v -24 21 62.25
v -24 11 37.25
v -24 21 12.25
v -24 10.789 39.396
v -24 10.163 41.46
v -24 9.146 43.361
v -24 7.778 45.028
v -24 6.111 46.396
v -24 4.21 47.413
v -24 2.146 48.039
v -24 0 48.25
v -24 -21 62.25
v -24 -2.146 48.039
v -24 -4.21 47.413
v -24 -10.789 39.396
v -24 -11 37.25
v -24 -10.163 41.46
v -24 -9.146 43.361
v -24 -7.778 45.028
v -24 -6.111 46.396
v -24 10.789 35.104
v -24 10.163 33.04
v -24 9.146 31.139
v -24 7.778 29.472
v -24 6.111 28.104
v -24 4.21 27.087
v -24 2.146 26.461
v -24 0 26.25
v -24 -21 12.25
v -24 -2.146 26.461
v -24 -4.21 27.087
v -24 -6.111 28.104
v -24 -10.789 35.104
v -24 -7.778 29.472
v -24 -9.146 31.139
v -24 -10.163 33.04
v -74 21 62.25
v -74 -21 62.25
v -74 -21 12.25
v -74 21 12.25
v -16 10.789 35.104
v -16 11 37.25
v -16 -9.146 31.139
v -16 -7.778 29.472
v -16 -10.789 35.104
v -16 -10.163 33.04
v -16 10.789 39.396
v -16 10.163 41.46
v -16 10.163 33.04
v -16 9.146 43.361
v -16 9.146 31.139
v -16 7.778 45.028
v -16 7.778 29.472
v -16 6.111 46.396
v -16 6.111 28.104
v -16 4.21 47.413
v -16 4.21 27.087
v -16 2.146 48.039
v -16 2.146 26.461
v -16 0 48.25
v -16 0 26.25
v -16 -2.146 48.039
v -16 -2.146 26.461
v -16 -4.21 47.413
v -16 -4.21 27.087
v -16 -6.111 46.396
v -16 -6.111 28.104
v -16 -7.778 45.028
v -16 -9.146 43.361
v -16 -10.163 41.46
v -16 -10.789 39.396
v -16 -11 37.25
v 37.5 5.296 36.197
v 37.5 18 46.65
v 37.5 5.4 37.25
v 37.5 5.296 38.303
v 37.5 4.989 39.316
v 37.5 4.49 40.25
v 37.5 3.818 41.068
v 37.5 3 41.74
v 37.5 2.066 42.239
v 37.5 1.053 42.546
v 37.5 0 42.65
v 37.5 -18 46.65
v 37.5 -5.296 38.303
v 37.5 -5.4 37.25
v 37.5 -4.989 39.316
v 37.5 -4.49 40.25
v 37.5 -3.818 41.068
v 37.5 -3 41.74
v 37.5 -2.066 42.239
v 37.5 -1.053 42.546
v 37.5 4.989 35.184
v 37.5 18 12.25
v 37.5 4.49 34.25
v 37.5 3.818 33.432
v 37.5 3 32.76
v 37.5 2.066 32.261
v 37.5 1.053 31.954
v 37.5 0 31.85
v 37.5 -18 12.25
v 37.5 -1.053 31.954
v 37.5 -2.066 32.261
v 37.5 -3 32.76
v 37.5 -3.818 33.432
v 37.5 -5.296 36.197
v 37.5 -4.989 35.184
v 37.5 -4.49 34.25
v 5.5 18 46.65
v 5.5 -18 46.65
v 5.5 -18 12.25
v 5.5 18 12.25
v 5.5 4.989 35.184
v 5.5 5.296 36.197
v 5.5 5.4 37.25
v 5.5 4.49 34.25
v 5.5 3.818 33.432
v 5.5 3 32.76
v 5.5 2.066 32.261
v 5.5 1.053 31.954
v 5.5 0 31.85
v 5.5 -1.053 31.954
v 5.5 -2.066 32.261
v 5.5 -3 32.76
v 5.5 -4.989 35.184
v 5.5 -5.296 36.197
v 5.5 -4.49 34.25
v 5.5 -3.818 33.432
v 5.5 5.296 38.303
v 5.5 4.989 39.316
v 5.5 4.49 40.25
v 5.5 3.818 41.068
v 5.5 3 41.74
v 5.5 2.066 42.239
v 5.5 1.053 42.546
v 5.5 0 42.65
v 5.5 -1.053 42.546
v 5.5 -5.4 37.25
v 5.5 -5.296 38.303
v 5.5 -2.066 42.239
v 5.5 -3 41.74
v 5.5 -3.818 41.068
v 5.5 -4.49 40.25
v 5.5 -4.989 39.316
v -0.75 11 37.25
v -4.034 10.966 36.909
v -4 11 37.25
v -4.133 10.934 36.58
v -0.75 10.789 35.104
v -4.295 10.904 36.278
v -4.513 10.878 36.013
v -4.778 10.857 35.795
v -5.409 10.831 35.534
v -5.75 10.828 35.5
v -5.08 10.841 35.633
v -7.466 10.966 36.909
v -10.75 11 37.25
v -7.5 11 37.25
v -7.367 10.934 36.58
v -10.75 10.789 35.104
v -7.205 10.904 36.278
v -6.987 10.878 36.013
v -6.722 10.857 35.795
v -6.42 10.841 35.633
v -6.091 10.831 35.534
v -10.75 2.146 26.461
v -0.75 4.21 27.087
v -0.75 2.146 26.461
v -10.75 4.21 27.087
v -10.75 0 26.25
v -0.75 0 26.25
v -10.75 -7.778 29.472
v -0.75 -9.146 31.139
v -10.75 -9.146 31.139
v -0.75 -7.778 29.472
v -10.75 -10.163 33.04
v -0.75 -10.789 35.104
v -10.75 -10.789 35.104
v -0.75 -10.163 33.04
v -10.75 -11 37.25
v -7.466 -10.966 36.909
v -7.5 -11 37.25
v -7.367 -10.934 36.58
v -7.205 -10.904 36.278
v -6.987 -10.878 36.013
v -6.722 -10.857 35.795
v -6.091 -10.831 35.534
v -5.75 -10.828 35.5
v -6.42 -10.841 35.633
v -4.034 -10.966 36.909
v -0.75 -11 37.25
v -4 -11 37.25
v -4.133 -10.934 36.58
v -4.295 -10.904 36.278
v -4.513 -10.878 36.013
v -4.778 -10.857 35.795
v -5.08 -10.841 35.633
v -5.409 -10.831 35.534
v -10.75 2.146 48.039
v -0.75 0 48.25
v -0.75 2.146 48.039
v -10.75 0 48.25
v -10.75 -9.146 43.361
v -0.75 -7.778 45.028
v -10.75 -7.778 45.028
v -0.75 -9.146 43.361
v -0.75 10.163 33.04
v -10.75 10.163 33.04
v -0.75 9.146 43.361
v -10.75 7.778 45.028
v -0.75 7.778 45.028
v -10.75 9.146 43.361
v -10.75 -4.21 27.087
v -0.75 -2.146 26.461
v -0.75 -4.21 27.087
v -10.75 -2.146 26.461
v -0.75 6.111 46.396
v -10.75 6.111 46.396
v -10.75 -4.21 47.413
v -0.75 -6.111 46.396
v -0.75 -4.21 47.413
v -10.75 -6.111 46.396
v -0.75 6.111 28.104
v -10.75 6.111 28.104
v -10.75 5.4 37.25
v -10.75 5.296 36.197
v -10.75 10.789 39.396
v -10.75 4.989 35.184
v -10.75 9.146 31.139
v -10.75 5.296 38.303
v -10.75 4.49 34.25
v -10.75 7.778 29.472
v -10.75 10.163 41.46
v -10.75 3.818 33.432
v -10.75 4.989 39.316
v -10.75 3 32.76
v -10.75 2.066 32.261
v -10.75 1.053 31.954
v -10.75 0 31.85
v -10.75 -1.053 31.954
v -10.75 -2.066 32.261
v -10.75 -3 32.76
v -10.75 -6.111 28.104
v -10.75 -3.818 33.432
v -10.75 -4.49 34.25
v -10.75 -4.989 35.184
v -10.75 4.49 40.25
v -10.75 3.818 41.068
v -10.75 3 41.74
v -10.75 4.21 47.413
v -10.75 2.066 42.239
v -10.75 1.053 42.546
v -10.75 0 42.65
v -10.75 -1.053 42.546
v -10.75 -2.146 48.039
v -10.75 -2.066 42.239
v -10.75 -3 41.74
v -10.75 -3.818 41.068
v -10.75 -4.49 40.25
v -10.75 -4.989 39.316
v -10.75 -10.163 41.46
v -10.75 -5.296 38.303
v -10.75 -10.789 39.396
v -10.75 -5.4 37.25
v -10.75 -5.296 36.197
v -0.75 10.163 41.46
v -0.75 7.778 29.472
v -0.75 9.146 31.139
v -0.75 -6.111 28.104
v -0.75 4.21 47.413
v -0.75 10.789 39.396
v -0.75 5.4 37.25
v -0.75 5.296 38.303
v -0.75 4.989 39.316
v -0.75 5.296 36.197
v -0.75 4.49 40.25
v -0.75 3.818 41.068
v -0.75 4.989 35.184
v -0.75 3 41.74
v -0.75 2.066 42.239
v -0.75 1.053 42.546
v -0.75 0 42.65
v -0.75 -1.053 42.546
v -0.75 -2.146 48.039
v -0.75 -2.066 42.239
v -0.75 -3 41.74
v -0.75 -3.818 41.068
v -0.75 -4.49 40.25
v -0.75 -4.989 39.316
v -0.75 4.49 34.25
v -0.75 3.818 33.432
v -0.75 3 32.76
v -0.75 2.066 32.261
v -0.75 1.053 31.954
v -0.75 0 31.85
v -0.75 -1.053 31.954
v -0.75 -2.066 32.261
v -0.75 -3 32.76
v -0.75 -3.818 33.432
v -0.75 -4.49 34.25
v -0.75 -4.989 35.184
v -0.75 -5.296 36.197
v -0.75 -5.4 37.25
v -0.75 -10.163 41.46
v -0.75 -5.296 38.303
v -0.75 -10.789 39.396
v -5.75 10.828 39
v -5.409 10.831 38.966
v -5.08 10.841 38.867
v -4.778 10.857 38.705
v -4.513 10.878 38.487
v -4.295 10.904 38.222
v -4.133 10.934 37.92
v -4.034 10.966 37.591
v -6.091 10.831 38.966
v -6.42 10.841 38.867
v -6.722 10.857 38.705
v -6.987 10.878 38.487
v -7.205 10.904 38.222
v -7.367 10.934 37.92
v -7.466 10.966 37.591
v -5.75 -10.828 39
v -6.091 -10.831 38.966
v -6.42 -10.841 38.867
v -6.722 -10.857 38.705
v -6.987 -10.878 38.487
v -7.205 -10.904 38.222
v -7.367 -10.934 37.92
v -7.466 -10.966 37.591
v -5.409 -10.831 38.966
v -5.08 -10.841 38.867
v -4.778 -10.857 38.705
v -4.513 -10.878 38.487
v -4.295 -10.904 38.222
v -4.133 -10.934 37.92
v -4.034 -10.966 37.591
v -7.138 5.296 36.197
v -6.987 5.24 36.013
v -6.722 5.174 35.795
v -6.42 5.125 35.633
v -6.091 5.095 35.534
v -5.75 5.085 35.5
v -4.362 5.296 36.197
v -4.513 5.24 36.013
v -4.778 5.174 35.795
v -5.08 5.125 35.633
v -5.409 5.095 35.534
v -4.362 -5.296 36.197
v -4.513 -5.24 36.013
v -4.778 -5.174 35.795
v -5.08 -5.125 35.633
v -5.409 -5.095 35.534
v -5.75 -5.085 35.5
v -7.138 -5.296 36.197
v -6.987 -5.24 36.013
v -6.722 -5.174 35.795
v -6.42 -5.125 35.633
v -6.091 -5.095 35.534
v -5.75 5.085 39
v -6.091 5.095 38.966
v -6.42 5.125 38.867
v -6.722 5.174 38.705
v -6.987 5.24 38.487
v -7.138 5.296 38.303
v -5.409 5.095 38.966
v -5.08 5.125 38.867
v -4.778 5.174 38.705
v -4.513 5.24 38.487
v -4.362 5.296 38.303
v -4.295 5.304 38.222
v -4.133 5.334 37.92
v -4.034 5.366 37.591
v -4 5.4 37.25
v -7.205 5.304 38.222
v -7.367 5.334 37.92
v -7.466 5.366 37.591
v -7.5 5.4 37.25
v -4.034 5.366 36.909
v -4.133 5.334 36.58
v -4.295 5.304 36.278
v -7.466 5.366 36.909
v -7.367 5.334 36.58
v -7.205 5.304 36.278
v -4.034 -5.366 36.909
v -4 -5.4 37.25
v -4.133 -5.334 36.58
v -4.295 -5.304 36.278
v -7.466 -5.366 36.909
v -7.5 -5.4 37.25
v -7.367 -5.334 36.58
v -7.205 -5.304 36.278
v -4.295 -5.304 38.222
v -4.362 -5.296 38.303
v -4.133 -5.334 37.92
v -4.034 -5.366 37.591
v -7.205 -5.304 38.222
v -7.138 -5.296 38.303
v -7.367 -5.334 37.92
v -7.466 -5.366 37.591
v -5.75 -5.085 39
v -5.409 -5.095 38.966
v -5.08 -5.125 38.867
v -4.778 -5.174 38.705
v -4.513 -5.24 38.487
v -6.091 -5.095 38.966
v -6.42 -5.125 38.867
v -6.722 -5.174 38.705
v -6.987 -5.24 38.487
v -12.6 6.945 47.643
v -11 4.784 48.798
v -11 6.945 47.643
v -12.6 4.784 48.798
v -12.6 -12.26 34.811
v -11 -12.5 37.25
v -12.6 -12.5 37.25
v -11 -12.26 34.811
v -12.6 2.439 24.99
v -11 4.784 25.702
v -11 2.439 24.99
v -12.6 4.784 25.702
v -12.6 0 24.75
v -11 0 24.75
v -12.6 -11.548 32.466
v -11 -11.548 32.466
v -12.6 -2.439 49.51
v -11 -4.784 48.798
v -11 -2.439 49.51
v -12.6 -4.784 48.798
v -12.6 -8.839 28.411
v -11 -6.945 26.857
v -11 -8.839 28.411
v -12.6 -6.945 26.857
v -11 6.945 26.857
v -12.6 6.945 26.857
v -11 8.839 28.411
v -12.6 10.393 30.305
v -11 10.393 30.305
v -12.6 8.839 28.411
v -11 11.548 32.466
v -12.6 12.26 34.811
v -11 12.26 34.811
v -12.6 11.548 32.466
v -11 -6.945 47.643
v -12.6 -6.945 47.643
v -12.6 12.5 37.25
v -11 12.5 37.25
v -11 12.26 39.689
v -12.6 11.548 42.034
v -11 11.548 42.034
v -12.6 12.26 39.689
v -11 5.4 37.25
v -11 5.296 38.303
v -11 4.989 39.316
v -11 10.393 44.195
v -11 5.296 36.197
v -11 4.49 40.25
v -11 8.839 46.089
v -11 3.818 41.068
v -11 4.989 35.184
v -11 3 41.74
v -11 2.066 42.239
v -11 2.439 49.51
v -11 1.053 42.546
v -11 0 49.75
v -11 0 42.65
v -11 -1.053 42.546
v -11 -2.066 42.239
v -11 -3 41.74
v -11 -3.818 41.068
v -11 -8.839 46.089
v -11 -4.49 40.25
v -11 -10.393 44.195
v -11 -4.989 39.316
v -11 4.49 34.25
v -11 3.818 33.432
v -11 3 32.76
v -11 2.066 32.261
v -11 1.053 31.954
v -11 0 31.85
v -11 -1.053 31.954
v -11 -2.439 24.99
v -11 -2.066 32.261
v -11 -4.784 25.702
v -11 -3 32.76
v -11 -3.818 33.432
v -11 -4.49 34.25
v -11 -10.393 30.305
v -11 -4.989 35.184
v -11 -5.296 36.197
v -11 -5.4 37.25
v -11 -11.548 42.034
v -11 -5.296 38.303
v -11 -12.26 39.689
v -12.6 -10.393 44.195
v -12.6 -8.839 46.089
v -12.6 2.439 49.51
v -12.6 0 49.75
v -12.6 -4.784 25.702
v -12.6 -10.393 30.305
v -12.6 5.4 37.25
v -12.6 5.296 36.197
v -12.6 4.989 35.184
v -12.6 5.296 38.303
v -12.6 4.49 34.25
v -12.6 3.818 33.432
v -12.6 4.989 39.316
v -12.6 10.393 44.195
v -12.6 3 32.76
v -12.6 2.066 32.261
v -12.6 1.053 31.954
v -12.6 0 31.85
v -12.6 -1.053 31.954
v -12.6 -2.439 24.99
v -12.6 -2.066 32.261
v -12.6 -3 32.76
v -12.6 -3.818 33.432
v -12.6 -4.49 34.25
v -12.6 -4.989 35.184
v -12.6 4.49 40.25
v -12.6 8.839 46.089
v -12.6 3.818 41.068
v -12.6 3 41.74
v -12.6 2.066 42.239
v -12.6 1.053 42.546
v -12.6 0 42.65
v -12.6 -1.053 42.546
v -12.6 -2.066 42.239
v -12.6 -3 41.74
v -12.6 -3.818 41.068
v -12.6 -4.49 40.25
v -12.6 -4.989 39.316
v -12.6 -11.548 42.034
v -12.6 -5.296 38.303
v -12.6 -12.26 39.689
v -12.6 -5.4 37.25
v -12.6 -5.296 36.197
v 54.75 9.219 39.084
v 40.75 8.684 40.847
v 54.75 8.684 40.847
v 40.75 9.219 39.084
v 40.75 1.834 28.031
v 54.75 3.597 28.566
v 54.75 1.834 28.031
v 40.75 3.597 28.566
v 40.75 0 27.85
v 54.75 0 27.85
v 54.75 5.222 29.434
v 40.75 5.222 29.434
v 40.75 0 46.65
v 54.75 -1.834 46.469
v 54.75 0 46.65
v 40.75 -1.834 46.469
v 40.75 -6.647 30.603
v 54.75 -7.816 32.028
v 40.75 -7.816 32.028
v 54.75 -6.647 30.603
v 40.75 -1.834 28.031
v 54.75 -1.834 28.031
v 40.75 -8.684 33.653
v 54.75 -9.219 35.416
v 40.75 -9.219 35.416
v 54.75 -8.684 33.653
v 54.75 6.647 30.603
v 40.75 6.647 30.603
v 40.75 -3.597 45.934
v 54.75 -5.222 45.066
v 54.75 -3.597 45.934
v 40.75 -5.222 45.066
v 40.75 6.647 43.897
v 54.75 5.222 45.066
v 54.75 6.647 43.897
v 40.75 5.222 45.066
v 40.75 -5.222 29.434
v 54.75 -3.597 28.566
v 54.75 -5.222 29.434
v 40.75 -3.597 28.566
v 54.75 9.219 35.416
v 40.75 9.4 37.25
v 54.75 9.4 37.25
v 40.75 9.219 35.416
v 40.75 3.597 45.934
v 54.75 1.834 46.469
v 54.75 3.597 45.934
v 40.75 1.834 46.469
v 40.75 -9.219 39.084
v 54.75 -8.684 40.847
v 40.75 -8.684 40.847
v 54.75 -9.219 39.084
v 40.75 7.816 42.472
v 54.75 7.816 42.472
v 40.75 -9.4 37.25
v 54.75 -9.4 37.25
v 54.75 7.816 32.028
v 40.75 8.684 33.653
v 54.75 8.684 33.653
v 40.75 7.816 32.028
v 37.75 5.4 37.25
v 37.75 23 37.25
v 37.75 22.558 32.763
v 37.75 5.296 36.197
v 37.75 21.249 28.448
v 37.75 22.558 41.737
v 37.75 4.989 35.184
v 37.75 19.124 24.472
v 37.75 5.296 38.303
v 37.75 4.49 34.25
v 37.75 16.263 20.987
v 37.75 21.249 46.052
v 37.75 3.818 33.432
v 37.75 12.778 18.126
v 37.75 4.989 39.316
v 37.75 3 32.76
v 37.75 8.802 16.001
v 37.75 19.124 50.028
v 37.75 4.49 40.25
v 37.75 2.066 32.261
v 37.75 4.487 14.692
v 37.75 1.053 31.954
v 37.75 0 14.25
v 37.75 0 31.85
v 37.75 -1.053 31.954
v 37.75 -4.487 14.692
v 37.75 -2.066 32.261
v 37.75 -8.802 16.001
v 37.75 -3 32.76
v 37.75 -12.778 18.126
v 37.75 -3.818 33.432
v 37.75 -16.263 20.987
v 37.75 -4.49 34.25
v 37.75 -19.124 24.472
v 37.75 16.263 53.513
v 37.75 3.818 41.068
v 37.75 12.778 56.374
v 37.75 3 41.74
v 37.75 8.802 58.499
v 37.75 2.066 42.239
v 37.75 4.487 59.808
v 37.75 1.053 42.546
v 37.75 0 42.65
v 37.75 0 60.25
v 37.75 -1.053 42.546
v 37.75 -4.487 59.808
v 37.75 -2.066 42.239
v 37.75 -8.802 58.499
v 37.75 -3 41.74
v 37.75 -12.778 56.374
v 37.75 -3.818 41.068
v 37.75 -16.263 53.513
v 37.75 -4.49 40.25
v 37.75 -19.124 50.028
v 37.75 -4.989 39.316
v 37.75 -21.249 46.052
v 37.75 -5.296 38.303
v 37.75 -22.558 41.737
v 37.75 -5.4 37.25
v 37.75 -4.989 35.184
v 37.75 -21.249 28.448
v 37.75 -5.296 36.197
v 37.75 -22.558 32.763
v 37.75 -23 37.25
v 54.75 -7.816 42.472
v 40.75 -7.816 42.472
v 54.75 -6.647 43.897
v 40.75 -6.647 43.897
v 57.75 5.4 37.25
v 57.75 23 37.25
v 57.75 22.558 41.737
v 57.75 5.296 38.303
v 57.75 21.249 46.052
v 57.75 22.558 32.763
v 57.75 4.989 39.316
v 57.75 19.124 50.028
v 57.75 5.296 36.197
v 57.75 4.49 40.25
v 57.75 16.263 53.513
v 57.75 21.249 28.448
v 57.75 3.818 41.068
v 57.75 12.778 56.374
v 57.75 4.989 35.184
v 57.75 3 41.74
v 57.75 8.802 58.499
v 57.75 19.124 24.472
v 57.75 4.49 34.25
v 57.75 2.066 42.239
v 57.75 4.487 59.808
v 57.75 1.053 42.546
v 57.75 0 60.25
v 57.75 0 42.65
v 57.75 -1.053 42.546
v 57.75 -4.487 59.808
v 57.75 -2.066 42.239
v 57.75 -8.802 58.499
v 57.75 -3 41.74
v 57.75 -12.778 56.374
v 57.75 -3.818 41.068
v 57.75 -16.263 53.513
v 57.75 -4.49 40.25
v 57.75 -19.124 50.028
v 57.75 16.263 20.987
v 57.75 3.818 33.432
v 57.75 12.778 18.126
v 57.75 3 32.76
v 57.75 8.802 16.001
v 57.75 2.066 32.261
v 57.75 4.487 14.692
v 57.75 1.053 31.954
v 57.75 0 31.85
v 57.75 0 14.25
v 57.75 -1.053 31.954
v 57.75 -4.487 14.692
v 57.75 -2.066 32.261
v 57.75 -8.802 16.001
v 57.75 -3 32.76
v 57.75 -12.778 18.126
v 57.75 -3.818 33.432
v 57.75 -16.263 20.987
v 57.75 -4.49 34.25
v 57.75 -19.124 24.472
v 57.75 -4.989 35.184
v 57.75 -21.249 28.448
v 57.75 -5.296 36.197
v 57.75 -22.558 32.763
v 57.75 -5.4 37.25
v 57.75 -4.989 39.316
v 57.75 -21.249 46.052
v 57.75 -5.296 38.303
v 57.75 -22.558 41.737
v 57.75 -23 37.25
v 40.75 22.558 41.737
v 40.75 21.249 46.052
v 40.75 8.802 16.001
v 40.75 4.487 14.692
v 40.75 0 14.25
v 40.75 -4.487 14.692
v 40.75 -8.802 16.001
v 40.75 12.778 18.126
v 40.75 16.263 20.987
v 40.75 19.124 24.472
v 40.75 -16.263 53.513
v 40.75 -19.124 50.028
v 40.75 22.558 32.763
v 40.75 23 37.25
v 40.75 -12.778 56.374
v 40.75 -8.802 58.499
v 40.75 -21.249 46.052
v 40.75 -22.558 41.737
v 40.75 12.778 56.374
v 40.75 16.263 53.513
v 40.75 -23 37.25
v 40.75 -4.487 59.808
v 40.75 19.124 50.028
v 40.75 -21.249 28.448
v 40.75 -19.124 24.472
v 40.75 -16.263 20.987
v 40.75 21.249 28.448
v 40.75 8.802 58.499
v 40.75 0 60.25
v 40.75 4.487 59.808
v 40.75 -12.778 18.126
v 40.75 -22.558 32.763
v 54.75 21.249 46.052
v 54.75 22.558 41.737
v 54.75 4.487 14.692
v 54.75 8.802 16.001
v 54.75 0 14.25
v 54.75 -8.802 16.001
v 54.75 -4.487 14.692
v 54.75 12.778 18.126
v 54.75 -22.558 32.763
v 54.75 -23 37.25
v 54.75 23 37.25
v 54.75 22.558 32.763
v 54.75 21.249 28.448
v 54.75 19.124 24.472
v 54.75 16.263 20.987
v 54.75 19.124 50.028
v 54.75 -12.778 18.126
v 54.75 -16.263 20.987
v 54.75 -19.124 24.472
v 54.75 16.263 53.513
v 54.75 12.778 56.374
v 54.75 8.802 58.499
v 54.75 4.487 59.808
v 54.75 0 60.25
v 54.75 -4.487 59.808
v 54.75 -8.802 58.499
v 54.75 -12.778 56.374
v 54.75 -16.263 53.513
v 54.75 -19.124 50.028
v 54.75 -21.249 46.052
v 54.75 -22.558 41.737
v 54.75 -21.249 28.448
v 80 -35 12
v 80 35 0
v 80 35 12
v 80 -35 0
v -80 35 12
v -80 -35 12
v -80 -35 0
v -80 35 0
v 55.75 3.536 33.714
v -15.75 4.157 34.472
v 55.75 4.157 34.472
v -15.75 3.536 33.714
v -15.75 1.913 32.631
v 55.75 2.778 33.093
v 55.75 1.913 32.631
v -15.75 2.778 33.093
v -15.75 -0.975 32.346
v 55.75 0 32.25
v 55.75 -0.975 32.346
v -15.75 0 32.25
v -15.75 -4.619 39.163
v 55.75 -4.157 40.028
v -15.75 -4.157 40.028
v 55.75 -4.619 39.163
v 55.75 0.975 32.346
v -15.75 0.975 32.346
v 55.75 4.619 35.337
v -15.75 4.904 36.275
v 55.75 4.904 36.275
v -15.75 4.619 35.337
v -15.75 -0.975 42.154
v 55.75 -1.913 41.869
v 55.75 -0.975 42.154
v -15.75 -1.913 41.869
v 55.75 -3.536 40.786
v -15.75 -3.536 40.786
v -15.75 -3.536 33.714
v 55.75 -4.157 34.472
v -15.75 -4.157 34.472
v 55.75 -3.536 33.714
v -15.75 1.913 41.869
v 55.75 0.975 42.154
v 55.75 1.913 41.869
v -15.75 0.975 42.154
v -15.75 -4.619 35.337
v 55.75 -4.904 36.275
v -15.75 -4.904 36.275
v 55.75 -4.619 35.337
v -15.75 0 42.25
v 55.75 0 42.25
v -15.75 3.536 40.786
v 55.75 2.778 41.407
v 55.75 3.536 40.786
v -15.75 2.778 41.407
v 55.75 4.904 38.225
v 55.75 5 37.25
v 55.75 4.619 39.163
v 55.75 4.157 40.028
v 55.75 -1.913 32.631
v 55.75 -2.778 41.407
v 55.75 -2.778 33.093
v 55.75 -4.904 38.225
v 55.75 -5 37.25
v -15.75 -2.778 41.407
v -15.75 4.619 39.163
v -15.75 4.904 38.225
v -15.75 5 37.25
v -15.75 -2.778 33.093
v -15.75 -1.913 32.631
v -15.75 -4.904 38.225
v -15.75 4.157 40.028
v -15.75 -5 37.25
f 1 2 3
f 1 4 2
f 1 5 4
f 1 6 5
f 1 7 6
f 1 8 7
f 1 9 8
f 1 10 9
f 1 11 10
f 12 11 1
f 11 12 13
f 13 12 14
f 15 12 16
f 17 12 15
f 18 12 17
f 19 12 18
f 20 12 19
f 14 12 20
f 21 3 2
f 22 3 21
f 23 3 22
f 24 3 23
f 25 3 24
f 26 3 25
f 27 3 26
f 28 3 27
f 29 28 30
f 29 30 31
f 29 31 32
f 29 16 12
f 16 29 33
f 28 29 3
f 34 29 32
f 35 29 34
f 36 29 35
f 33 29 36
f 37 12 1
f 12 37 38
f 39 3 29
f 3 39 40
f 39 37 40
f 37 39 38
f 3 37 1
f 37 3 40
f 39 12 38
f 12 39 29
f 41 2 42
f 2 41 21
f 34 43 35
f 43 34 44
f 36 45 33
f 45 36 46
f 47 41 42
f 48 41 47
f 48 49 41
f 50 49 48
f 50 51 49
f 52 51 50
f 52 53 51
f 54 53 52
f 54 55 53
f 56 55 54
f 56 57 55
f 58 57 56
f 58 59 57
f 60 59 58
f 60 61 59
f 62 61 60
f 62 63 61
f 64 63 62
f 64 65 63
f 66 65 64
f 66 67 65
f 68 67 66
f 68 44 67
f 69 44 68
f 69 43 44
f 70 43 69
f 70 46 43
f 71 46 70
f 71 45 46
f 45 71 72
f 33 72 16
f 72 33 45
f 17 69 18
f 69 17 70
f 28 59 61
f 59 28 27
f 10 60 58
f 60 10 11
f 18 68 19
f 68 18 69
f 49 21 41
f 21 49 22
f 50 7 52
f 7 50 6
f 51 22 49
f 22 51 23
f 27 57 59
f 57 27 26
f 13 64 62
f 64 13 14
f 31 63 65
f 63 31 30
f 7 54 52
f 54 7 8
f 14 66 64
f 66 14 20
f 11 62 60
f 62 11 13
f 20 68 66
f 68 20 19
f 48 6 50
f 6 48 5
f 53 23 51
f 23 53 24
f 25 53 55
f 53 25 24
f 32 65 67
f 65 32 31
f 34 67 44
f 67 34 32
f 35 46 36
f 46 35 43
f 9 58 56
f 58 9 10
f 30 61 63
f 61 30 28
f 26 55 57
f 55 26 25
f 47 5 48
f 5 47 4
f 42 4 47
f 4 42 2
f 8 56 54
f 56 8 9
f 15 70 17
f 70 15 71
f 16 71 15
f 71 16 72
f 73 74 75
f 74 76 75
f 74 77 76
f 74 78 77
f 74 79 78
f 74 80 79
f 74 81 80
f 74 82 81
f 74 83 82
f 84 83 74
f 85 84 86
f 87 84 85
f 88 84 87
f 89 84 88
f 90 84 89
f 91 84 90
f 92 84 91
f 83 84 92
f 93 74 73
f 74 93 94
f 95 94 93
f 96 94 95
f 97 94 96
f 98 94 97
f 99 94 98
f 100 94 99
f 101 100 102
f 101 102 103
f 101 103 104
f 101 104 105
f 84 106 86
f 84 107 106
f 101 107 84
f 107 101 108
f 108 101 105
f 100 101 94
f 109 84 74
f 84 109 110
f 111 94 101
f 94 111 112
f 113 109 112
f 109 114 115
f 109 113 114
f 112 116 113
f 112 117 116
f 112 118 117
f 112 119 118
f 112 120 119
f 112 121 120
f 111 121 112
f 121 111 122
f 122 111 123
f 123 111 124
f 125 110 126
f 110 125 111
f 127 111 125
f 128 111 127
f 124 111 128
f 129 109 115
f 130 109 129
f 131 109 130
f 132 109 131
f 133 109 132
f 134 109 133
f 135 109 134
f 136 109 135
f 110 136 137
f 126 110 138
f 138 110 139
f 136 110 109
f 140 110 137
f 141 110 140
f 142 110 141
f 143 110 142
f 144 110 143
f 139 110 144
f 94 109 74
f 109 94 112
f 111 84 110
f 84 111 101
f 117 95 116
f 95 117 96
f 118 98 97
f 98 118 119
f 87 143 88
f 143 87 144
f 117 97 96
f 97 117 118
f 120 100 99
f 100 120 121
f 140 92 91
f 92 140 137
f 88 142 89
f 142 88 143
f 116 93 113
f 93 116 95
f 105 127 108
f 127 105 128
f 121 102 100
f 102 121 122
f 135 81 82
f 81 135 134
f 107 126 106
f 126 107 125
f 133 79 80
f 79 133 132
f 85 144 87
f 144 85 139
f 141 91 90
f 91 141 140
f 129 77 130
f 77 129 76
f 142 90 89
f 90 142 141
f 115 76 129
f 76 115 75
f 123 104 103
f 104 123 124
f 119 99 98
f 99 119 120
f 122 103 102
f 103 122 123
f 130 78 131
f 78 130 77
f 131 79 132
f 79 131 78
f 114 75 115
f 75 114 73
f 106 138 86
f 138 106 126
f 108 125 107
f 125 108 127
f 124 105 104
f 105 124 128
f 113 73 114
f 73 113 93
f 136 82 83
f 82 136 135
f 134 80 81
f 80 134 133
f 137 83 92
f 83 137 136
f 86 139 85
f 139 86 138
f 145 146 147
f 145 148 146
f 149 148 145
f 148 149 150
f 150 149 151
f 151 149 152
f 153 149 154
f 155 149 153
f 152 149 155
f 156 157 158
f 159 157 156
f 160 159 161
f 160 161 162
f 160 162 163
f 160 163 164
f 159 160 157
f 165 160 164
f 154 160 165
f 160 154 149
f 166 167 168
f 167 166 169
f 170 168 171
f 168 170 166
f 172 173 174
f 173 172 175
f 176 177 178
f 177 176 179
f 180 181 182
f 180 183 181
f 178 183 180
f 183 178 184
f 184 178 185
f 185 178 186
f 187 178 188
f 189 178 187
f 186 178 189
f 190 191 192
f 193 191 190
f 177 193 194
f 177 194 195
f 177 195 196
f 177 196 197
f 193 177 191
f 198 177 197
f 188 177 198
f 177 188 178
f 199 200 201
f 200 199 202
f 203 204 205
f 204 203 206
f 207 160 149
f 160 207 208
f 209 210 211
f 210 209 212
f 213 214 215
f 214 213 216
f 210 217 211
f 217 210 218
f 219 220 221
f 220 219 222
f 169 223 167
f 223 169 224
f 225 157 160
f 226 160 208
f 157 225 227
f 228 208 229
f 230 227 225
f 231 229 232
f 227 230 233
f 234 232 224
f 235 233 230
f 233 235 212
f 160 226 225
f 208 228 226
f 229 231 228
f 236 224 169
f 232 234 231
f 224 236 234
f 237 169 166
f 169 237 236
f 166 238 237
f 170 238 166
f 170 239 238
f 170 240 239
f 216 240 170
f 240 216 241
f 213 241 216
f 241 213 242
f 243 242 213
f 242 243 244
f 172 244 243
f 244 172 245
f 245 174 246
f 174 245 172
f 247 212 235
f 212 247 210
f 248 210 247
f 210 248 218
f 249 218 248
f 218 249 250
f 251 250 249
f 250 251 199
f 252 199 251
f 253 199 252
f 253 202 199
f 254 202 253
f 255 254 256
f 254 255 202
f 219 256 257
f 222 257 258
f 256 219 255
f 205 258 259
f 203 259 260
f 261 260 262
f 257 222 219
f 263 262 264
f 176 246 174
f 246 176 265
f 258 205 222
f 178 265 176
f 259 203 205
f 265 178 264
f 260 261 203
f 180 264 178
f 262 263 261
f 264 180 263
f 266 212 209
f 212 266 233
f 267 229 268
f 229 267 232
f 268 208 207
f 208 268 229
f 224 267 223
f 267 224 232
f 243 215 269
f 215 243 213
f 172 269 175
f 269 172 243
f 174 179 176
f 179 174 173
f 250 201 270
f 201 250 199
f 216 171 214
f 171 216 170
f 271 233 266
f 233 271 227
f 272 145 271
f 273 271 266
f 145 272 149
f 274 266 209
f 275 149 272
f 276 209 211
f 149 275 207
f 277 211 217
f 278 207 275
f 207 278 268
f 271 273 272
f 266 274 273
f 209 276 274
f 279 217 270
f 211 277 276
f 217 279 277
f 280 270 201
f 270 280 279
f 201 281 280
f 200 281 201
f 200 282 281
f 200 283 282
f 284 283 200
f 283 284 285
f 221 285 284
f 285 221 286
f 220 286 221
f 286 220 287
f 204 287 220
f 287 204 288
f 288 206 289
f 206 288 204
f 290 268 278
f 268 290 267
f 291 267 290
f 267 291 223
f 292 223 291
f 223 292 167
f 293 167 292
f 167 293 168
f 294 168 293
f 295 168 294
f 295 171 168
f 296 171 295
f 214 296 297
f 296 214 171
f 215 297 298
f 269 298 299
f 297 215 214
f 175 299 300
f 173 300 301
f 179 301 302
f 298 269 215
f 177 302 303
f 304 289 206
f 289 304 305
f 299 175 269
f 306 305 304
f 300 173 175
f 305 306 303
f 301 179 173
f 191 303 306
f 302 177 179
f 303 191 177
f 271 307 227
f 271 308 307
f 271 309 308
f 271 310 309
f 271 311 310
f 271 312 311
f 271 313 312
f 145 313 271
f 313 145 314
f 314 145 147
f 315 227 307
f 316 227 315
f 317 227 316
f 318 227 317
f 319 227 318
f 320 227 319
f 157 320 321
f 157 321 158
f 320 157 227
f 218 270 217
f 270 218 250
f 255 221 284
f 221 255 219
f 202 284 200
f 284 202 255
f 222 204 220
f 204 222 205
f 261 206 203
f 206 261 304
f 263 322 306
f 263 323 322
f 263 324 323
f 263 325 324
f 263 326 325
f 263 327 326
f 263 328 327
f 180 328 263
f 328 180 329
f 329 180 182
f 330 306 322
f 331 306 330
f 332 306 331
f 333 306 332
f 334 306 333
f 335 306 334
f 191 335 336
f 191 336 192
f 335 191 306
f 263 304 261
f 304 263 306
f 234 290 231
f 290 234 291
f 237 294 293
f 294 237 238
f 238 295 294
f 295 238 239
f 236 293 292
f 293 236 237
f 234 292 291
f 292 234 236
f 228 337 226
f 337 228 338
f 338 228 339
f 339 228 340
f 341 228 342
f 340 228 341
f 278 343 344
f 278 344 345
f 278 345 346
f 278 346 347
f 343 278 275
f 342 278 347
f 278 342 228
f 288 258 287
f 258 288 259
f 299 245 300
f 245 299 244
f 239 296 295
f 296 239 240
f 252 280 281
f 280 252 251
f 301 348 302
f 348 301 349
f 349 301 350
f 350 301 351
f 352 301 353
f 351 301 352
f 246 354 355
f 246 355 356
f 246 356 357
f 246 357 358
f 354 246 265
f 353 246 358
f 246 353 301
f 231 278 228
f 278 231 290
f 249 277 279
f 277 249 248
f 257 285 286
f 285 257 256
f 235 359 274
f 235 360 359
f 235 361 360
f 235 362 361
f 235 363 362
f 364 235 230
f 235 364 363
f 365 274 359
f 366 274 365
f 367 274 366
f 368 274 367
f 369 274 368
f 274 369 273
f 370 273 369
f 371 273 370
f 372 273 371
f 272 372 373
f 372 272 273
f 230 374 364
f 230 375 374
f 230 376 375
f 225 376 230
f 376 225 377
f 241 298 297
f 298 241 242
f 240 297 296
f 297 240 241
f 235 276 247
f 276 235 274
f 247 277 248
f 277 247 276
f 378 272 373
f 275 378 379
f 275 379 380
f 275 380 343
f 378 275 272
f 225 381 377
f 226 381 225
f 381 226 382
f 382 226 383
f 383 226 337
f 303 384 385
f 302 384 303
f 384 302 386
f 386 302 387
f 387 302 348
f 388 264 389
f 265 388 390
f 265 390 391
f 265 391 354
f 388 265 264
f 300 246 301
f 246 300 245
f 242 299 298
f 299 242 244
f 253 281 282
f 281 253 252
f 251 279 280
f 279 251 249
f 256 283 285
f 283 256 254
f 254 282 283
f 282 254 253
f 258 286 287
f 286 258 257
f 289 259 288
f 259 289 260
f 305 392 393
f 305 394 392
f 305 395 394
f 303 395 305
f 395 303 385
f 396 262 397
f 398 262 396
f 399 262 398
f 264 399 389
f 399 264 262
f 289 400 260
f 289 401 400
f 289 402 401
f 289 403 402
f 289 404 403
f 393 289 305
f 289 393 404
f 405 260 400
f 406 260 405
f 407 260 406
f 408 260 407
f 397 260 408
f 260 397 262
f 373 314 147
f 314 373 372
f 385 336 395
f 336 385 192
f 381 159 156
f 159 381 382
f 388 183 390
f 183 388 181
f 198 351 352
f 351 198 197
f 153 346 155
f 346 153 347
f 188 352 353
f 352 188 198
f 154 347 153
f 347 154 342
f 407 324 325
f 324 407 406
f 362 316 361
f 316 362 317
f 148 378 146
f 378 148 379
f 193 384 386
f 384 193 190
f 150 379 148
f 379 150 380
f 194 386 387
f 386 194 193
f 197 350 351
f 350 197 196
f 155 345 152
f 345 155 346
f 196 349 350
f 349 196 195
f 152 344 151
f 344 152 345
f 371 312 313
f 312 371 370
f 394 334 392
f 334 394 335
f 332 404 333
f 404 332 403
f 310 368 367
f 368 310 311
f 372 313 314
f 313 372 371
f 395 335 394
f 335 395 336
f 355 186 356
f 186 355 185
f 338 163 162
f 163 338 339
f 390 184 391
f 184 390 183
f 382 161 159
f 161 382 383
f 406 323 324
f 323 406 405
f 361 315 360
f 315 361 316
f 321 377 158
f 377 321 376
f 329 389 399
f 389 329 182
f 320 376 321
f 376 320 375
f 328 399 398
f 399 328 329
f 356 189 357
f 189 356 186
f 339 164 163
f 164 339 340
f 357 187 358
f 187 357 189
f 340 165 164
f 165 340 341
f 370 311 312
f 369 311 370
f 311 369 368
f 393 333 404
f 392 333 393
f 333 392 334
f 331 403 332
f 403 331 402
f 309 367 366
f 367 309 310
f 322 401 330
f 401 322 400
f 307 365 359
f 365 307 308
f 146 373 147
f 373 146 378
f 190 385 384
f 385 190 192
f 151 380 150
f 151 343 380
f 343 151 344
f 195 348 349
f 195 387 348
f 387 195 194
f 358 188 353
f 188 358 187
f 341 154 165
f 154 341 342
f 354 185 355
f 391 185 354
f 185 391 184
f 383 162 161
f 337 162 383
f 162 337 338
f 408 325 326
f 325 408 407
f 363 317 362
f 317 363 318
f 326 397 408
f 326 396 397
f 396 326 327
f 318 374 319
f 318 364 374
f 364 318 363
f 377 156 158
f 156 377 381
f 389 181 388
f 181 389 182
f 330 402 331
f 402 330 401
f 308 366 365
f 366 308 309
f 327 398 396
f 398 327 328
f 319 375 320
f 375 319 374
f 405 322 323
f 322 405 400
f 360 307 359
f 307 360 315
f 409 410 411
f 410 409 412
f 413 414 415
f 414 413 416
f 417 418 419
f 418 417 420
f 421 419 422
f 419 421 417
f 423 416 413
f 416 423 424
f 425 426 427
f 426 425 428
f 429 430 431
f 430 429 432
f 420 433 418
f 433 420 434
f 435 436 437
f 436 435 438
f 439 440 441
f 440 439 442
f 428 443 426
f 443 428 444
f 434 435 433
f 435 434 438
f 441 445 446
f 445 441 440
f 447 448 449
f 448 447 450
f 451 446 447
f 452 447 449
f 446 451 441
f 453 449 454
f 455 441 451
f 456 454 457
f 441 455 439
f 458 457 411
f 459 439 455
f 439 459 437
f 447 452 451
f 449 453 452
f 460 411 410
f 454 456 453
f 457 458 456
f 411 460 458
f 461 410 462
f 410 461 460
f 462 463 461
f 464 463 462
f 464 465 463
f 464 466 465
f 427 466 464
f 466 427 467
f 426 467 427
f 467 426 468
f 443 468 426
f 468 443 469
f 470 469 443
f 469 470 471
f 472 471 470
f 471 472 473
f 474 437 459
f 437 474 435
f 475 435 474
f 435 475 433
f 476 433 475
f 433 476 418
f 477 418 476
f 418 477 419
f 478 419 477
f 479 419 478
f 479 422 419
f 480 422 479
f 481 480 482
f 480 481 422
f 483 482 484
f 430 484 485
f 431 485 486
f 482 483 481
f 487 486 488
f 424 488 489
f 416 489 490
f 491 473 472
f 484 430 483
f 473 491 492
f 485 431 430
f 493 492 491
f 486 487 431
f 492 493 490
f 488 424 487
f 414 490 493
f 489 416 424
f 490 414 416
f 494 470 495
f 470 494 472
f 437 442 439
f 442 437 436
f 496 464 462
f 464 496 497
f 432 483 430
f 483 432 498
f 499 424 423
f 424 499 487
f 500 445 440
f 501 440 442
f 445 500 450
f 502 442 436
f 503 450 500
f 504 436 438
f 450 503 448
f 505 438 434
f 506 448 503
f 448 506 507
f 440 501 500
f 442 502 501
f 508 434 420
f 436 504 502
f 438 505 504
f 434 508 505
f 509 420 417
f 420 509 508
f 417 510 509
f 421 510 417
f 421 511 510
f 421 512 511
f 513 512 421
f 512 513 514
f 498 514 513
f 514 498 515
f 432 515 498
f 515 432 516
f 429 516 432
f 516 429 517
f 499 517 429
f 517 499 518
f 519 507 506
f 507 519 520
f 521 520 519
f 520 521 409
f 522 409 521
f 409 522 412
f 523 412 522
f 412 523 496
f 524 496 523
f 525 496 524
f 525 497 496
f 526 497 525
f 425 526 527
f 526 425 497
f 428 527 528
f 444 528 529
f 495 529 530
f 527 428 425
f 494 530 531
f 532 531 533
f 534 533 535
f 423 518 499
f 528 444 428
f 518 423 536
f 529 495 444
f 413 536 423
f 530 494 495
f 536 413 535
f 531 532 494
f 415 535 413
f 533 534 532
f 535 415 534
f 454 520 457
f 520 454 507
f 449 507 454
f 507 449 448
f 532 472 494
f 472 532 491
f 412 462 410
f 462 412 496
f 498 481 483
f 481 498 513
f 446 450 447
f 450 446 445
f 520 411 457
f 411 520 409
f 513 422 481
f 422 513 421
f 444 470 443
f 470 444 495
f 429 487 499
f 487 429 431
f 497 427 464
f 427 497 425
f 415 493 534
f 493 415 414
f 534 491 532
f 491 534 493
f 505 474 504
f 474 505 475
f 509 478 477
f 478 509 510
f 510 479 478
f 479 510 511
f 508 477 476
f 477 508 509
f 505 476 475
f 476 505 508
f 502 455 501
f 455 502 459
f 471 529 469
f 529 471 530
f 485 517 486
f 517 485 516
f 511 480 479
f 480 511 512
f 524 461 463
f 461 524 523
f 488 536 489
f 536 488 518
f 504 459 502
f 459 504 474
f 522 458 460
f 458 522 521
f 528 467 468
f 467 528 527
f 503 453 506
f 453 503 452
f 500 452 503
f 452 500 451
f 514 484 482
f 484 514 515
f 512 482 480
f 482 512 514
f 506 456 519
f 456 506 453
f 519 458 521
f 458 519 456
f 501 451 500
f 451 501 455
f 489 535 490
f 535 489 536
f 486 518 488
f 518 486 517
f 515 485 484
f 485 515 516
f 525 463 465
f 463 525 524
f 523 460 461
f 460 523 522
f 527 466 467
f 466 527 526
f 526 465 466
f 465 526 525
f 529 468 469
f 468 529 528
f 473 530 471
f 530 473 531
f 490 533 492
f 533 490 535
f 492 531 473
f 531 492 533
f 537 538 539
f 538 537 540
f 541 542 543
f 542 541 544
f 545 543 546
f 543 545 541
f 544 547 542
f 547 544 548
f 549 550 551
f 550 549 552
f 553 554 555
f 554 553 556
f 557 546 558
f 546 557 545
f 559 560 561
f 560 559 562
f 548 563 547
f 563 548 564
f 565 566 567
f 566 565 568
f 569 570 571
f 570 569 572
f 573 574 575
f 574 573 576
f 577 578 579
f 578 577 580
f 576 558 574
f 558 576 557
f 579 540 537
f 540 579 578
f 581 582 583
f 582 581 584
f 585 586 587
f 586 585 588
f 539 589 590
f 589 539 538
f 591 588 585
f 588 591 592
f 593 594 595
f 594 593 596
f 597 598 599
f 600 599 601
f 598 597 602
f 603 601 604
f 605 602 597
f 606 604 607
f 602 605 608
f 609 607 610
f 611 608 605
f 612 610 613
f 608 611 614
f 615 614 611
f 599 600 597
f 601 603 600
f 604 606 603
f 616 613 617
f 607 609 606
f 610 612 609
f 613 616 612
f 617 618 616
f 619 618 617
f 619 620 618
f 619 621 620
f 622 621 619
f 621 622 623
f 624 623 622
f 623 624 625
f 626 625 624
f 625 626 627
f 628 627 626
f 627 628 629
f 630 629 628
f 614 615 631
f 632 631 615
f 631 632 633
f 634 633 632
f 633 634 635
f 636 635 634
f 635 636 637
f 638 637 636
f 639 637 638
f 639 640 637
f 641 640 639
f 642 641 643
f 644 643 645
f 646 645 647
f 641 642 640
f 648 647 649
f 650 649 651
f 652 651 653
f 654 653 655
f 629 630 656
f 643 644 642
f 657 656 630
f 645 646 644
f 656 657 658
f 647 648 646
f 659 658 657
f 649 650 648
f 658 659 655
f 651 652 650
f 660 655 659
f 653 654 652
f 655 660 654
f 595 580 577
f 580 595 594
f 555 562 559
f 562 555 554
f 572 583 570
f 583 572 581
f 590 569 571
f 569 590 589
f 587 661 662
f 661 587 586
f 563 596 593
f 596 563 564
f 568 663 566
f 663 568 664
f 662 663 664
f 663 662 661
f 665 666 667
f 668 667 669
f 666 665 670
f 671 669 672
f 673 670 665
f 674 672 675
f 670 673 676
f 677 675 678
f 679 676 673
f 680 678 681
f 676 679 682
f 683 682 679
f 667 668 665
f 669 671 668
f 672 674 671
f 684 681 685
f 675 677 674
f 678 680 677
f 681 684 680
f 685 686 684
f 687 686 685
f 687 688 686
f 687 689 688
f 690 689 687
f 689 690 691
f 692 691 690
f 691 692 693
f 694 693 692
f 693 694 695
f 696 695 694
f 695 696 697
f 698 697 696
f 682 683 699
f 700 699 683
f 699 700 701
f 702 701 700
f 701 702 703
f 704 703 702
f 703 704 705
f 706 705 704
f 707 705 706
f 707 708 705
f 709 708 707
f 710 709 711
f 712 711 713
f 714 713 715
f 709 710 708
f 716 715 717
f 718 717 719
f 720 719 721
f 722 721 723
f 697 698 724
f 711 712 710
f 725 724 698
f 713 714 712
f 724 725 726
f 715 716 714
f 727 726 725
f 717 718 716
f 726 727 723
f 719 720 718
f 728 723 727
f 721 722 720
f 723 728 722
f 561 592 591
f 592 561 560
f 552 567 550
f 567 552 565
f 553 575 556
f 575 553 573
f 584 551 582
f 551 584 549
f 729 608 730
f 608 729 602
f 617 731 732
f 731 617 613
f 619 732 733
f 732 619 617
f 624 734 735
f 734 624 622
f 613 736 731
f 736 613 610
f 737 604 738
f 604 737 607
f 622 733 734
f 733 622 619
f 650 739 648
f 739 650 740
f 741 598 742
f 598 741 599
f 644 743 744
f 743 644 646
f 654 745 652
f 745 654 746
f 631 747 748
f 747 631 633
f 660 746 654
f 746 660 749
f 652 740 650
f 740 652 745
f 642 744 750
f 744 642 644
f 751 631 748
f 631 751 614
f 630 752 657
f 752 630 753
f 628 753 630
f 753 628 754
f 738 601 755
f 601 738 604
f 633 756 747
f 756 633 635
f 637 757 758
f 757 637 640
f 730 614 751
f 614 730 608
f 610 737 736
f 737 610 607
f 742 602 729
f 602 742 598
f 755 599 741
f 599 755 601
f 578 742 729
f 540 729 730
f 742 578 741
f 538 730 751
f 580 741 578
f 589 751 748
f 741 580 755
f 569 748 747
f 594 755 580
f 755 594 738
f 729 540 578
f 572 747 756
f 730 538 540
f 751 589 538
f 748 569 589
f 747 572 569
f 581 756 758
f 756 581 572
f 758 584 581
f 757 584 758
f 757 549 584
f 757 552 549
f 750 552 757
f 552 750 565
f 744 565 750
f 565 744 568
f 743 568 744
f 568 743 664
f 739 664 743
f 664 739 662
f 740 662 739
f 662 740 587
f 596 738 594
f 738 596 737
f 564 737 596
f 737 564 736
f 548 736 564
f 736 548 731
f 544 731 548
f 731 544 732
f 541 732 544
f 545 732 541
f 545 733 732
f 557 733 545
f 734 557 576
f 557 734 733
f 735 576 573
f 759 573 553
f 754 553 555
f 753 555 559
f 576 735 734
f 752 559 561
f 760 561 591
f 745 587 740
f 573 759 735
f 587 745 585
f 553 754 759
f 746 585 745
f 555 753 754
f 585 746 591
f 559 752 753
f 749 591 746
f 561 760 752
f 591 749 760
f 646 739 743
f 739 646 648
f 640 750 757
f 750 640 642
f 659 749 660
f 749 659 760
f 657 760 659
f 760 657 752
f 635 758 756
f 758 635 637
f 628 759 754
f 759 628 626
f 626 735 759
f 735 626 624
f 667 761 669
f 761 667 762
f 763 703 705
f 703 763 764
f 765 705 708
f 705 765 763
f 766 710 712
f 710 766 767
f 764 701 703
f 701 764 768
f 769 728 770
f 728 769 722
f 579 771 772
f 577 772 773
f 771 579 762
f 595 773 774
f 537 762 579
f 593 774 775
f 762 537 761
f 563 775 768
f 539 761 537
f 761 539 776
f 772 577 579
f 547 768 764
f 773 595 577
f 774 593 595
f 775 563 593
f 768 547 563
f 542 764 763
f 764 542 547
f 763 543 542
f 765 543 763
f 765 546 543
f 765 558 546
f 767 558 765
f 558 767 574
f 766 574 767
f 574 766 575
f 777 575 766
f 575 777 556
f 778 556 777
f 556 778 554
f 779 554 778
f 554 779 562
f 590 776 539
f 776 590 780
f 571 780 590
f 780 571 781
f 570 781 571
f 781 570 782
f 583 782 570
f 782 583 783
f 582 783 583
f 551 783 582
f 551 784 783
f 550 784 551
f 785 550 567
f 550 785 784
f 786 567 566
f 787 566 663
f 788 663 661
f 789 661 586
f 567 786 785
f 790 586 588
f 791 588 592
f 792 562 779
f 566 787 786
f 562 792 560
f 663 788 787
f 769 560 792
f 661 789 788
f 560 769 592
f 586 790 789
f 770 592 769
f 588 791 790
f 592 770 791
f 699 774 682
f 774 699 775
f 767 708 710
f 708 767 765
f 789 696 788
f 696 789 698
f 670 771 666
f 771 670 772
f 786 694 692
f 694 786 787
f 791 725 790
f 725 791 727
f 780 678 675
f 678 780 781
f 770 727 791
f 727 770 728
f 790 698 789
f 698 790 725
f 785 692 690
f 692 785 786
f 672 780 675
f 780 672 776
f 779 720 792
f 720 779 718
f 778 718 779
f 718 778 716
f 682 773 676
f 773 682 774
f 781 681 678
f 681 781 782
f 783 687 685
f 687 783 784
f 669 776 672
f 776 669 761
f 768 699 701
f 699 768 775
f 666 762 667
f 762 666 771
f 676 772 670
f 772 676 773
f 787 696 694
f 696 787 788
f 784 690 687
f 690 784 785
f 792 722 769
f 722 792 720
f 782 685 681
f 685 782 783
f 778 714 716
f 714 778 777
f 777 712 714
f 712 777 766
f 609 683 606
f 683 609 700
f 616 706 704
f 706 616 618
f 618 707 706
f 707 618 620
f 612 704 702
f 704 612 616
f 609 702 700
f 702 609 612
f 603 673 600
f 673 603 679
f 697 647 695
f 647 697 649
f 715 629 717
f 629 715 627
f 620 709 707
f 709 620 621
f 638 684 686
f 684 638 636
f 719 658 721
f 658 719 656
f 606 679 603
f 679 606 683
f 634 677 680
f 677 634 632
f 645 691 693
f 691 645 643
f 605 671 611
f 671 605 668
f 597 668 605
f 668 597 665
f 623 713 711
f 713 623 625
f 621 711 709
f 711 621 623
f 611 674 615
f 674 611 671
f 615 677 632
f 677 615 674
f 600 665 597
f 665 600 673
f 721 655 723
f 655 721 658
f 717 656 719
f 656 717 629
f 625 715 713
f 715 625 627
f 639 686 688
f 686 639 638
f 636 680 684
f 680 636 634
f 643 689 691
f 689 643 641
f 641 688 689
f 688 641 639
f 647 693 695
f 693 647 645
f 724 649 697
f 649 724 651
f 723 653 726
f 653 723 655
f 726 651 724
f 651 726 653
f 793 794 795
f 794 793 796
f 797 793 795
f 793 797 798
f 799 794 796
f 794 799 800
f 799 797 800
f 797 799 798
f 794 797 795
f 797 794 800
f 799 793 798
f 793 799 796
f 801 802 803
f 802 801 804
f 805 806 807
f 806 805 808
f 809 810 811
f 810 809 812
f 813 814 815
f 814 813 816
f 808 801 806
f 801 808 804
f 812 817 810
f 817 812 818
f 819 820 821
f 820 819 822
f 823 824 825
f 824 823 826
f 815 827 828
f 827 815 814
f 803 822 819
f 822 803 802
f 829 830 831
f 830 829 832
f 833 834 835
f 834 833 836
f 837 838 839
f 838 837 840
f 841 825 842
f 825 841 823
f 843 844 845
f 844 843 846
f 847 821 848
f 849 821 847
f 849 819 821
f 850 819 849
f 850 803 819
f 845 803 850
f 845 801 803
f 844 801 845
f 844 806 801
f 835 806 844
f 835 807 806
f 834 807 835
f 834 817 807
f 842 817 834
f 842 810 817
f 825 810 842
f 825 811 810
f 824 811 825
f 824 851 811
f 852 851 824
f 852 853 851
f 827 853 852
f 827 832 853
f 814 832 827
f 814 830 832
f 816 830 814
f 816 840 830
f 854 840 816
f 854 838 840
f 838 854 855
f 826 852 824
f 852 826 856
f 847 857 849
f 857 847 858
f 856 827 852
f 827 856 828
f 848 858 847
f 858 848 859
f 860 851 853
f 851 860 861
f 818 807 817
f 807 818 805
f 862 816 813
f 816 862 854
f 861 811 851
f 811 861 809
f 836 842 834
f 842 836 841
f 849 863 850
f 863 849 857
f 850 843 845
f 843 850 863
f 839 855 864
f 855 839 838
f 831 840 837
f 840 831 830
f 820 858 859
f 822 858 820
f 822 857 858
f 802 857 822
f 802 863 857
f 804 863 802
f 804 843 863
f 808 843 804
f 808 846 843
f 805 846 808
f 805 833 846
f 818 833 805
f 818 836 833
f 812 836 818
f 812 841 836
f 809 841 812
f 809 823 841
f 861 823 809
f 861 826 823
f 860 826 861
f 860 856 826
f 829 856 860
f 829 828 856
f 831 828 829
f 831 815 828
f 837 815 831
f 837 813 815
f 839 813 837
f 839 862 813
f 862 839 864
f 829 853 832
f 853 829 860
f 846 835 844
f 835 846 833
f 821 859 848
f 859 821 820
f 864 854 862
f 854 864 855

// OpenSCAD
$fn = 32;

// ------------------------------------------------------------------------
// Motor drive station: motor 50 x 50 mm, shaft d10, pulley d46
// Every part is its own module, assembly() places every instance.
// ------------------------------------------------------------------------

// --- part 1 ---
module station_bed() {
  difference() {
    translate([-80, -35, 0]) cube([160, 70, 12]);
  }
}

// --- part 2 ---
module drive_motor() {
  union() {
    translate([-25, -21, 0]) cube([50, 42, 50]);
    translate([29, 0, 25]) rotate([0, 90, 0]) cylinder(h = 8, d = 22, center = true);
  }
}

// --- part 3 ---
module pillow_block() {
  difference() {
    translate([-16, -18, 0]) cube([32, 36, 34.4]);
    translate([0, 0, 25]) rotate([0, 90, 0]) cylinder(h = 34, d = 10.8, center = true);
  }
}

// --- part 4 ---
module drive_shaft() {
  translate([0, 0, -35.75]) cylinder(h = 71.5, d = 10);
}

// --- part 5 ---
module shaft_collar() {
  difference() {
    cylinder(h = 10, d = 22);
    translate([0, 0, -1]) cylinder(h = 12, d = 10.8);
    translate([0, 0, 5]) rotate([90, 0, 0]) cylinder(h = 24, d = 3.5, center = true);
  }
}

// --- part 6 ---
module collar_washer() {
  difference() {
      translate([0, 0, 0]) cylinder(h = 1.6, d = 25);
      translate([0, 0, -1]) cylinder(h = 3.6, d = 10.8);
    }
}

// --- part 7 ---
module drive_pulley() {
  difference() {
    union() {
      cylinder(h = 20, d = 18.8);
      cylinder(h = 3, d = 46);
      translate([0, 0, 17]) cylinder(h = 3, d = 46);
    }
    translate([0, 0, -1]) cylinder(h = 22, d = 10.8);
  }
}

// --- assembly ---
module assembly() {
  color([0.80, 0.24, 0.20]) translate([0, 0, 0]) rotate([0, 0, 0]) station_bed();
  color([0.20, 0.45, 0.75]) translate([-49, 0, 12.25]) rotate([0, 0, 0]) drive_motor();
  color([0.25, 0.62, 0.32]) translate([21.5, 0, 12.25]) rotate([0, 0, 0]) pillow_block();
  color([0.92, 0.70, 0.18]) translate([20, 0, 37.25]) rotate([0, 90, 0]) drive_shaft();
  color([0.58, 0.35, 0.70]) translate([-10.75, 0, 37.25]) rotate([0, 90, 0]) shaft_collar();
  color([0.16, 0.66, 0.66]) translate([-12.6, 0, 37.25]) rotate([0, 90, 0]) collar_washer();
  color([0.85, 0.48, 0.18]) translate([37.75, 0, 37.25]) rotate([0, 90, 0]) drive_pulley();
}

assembly();
